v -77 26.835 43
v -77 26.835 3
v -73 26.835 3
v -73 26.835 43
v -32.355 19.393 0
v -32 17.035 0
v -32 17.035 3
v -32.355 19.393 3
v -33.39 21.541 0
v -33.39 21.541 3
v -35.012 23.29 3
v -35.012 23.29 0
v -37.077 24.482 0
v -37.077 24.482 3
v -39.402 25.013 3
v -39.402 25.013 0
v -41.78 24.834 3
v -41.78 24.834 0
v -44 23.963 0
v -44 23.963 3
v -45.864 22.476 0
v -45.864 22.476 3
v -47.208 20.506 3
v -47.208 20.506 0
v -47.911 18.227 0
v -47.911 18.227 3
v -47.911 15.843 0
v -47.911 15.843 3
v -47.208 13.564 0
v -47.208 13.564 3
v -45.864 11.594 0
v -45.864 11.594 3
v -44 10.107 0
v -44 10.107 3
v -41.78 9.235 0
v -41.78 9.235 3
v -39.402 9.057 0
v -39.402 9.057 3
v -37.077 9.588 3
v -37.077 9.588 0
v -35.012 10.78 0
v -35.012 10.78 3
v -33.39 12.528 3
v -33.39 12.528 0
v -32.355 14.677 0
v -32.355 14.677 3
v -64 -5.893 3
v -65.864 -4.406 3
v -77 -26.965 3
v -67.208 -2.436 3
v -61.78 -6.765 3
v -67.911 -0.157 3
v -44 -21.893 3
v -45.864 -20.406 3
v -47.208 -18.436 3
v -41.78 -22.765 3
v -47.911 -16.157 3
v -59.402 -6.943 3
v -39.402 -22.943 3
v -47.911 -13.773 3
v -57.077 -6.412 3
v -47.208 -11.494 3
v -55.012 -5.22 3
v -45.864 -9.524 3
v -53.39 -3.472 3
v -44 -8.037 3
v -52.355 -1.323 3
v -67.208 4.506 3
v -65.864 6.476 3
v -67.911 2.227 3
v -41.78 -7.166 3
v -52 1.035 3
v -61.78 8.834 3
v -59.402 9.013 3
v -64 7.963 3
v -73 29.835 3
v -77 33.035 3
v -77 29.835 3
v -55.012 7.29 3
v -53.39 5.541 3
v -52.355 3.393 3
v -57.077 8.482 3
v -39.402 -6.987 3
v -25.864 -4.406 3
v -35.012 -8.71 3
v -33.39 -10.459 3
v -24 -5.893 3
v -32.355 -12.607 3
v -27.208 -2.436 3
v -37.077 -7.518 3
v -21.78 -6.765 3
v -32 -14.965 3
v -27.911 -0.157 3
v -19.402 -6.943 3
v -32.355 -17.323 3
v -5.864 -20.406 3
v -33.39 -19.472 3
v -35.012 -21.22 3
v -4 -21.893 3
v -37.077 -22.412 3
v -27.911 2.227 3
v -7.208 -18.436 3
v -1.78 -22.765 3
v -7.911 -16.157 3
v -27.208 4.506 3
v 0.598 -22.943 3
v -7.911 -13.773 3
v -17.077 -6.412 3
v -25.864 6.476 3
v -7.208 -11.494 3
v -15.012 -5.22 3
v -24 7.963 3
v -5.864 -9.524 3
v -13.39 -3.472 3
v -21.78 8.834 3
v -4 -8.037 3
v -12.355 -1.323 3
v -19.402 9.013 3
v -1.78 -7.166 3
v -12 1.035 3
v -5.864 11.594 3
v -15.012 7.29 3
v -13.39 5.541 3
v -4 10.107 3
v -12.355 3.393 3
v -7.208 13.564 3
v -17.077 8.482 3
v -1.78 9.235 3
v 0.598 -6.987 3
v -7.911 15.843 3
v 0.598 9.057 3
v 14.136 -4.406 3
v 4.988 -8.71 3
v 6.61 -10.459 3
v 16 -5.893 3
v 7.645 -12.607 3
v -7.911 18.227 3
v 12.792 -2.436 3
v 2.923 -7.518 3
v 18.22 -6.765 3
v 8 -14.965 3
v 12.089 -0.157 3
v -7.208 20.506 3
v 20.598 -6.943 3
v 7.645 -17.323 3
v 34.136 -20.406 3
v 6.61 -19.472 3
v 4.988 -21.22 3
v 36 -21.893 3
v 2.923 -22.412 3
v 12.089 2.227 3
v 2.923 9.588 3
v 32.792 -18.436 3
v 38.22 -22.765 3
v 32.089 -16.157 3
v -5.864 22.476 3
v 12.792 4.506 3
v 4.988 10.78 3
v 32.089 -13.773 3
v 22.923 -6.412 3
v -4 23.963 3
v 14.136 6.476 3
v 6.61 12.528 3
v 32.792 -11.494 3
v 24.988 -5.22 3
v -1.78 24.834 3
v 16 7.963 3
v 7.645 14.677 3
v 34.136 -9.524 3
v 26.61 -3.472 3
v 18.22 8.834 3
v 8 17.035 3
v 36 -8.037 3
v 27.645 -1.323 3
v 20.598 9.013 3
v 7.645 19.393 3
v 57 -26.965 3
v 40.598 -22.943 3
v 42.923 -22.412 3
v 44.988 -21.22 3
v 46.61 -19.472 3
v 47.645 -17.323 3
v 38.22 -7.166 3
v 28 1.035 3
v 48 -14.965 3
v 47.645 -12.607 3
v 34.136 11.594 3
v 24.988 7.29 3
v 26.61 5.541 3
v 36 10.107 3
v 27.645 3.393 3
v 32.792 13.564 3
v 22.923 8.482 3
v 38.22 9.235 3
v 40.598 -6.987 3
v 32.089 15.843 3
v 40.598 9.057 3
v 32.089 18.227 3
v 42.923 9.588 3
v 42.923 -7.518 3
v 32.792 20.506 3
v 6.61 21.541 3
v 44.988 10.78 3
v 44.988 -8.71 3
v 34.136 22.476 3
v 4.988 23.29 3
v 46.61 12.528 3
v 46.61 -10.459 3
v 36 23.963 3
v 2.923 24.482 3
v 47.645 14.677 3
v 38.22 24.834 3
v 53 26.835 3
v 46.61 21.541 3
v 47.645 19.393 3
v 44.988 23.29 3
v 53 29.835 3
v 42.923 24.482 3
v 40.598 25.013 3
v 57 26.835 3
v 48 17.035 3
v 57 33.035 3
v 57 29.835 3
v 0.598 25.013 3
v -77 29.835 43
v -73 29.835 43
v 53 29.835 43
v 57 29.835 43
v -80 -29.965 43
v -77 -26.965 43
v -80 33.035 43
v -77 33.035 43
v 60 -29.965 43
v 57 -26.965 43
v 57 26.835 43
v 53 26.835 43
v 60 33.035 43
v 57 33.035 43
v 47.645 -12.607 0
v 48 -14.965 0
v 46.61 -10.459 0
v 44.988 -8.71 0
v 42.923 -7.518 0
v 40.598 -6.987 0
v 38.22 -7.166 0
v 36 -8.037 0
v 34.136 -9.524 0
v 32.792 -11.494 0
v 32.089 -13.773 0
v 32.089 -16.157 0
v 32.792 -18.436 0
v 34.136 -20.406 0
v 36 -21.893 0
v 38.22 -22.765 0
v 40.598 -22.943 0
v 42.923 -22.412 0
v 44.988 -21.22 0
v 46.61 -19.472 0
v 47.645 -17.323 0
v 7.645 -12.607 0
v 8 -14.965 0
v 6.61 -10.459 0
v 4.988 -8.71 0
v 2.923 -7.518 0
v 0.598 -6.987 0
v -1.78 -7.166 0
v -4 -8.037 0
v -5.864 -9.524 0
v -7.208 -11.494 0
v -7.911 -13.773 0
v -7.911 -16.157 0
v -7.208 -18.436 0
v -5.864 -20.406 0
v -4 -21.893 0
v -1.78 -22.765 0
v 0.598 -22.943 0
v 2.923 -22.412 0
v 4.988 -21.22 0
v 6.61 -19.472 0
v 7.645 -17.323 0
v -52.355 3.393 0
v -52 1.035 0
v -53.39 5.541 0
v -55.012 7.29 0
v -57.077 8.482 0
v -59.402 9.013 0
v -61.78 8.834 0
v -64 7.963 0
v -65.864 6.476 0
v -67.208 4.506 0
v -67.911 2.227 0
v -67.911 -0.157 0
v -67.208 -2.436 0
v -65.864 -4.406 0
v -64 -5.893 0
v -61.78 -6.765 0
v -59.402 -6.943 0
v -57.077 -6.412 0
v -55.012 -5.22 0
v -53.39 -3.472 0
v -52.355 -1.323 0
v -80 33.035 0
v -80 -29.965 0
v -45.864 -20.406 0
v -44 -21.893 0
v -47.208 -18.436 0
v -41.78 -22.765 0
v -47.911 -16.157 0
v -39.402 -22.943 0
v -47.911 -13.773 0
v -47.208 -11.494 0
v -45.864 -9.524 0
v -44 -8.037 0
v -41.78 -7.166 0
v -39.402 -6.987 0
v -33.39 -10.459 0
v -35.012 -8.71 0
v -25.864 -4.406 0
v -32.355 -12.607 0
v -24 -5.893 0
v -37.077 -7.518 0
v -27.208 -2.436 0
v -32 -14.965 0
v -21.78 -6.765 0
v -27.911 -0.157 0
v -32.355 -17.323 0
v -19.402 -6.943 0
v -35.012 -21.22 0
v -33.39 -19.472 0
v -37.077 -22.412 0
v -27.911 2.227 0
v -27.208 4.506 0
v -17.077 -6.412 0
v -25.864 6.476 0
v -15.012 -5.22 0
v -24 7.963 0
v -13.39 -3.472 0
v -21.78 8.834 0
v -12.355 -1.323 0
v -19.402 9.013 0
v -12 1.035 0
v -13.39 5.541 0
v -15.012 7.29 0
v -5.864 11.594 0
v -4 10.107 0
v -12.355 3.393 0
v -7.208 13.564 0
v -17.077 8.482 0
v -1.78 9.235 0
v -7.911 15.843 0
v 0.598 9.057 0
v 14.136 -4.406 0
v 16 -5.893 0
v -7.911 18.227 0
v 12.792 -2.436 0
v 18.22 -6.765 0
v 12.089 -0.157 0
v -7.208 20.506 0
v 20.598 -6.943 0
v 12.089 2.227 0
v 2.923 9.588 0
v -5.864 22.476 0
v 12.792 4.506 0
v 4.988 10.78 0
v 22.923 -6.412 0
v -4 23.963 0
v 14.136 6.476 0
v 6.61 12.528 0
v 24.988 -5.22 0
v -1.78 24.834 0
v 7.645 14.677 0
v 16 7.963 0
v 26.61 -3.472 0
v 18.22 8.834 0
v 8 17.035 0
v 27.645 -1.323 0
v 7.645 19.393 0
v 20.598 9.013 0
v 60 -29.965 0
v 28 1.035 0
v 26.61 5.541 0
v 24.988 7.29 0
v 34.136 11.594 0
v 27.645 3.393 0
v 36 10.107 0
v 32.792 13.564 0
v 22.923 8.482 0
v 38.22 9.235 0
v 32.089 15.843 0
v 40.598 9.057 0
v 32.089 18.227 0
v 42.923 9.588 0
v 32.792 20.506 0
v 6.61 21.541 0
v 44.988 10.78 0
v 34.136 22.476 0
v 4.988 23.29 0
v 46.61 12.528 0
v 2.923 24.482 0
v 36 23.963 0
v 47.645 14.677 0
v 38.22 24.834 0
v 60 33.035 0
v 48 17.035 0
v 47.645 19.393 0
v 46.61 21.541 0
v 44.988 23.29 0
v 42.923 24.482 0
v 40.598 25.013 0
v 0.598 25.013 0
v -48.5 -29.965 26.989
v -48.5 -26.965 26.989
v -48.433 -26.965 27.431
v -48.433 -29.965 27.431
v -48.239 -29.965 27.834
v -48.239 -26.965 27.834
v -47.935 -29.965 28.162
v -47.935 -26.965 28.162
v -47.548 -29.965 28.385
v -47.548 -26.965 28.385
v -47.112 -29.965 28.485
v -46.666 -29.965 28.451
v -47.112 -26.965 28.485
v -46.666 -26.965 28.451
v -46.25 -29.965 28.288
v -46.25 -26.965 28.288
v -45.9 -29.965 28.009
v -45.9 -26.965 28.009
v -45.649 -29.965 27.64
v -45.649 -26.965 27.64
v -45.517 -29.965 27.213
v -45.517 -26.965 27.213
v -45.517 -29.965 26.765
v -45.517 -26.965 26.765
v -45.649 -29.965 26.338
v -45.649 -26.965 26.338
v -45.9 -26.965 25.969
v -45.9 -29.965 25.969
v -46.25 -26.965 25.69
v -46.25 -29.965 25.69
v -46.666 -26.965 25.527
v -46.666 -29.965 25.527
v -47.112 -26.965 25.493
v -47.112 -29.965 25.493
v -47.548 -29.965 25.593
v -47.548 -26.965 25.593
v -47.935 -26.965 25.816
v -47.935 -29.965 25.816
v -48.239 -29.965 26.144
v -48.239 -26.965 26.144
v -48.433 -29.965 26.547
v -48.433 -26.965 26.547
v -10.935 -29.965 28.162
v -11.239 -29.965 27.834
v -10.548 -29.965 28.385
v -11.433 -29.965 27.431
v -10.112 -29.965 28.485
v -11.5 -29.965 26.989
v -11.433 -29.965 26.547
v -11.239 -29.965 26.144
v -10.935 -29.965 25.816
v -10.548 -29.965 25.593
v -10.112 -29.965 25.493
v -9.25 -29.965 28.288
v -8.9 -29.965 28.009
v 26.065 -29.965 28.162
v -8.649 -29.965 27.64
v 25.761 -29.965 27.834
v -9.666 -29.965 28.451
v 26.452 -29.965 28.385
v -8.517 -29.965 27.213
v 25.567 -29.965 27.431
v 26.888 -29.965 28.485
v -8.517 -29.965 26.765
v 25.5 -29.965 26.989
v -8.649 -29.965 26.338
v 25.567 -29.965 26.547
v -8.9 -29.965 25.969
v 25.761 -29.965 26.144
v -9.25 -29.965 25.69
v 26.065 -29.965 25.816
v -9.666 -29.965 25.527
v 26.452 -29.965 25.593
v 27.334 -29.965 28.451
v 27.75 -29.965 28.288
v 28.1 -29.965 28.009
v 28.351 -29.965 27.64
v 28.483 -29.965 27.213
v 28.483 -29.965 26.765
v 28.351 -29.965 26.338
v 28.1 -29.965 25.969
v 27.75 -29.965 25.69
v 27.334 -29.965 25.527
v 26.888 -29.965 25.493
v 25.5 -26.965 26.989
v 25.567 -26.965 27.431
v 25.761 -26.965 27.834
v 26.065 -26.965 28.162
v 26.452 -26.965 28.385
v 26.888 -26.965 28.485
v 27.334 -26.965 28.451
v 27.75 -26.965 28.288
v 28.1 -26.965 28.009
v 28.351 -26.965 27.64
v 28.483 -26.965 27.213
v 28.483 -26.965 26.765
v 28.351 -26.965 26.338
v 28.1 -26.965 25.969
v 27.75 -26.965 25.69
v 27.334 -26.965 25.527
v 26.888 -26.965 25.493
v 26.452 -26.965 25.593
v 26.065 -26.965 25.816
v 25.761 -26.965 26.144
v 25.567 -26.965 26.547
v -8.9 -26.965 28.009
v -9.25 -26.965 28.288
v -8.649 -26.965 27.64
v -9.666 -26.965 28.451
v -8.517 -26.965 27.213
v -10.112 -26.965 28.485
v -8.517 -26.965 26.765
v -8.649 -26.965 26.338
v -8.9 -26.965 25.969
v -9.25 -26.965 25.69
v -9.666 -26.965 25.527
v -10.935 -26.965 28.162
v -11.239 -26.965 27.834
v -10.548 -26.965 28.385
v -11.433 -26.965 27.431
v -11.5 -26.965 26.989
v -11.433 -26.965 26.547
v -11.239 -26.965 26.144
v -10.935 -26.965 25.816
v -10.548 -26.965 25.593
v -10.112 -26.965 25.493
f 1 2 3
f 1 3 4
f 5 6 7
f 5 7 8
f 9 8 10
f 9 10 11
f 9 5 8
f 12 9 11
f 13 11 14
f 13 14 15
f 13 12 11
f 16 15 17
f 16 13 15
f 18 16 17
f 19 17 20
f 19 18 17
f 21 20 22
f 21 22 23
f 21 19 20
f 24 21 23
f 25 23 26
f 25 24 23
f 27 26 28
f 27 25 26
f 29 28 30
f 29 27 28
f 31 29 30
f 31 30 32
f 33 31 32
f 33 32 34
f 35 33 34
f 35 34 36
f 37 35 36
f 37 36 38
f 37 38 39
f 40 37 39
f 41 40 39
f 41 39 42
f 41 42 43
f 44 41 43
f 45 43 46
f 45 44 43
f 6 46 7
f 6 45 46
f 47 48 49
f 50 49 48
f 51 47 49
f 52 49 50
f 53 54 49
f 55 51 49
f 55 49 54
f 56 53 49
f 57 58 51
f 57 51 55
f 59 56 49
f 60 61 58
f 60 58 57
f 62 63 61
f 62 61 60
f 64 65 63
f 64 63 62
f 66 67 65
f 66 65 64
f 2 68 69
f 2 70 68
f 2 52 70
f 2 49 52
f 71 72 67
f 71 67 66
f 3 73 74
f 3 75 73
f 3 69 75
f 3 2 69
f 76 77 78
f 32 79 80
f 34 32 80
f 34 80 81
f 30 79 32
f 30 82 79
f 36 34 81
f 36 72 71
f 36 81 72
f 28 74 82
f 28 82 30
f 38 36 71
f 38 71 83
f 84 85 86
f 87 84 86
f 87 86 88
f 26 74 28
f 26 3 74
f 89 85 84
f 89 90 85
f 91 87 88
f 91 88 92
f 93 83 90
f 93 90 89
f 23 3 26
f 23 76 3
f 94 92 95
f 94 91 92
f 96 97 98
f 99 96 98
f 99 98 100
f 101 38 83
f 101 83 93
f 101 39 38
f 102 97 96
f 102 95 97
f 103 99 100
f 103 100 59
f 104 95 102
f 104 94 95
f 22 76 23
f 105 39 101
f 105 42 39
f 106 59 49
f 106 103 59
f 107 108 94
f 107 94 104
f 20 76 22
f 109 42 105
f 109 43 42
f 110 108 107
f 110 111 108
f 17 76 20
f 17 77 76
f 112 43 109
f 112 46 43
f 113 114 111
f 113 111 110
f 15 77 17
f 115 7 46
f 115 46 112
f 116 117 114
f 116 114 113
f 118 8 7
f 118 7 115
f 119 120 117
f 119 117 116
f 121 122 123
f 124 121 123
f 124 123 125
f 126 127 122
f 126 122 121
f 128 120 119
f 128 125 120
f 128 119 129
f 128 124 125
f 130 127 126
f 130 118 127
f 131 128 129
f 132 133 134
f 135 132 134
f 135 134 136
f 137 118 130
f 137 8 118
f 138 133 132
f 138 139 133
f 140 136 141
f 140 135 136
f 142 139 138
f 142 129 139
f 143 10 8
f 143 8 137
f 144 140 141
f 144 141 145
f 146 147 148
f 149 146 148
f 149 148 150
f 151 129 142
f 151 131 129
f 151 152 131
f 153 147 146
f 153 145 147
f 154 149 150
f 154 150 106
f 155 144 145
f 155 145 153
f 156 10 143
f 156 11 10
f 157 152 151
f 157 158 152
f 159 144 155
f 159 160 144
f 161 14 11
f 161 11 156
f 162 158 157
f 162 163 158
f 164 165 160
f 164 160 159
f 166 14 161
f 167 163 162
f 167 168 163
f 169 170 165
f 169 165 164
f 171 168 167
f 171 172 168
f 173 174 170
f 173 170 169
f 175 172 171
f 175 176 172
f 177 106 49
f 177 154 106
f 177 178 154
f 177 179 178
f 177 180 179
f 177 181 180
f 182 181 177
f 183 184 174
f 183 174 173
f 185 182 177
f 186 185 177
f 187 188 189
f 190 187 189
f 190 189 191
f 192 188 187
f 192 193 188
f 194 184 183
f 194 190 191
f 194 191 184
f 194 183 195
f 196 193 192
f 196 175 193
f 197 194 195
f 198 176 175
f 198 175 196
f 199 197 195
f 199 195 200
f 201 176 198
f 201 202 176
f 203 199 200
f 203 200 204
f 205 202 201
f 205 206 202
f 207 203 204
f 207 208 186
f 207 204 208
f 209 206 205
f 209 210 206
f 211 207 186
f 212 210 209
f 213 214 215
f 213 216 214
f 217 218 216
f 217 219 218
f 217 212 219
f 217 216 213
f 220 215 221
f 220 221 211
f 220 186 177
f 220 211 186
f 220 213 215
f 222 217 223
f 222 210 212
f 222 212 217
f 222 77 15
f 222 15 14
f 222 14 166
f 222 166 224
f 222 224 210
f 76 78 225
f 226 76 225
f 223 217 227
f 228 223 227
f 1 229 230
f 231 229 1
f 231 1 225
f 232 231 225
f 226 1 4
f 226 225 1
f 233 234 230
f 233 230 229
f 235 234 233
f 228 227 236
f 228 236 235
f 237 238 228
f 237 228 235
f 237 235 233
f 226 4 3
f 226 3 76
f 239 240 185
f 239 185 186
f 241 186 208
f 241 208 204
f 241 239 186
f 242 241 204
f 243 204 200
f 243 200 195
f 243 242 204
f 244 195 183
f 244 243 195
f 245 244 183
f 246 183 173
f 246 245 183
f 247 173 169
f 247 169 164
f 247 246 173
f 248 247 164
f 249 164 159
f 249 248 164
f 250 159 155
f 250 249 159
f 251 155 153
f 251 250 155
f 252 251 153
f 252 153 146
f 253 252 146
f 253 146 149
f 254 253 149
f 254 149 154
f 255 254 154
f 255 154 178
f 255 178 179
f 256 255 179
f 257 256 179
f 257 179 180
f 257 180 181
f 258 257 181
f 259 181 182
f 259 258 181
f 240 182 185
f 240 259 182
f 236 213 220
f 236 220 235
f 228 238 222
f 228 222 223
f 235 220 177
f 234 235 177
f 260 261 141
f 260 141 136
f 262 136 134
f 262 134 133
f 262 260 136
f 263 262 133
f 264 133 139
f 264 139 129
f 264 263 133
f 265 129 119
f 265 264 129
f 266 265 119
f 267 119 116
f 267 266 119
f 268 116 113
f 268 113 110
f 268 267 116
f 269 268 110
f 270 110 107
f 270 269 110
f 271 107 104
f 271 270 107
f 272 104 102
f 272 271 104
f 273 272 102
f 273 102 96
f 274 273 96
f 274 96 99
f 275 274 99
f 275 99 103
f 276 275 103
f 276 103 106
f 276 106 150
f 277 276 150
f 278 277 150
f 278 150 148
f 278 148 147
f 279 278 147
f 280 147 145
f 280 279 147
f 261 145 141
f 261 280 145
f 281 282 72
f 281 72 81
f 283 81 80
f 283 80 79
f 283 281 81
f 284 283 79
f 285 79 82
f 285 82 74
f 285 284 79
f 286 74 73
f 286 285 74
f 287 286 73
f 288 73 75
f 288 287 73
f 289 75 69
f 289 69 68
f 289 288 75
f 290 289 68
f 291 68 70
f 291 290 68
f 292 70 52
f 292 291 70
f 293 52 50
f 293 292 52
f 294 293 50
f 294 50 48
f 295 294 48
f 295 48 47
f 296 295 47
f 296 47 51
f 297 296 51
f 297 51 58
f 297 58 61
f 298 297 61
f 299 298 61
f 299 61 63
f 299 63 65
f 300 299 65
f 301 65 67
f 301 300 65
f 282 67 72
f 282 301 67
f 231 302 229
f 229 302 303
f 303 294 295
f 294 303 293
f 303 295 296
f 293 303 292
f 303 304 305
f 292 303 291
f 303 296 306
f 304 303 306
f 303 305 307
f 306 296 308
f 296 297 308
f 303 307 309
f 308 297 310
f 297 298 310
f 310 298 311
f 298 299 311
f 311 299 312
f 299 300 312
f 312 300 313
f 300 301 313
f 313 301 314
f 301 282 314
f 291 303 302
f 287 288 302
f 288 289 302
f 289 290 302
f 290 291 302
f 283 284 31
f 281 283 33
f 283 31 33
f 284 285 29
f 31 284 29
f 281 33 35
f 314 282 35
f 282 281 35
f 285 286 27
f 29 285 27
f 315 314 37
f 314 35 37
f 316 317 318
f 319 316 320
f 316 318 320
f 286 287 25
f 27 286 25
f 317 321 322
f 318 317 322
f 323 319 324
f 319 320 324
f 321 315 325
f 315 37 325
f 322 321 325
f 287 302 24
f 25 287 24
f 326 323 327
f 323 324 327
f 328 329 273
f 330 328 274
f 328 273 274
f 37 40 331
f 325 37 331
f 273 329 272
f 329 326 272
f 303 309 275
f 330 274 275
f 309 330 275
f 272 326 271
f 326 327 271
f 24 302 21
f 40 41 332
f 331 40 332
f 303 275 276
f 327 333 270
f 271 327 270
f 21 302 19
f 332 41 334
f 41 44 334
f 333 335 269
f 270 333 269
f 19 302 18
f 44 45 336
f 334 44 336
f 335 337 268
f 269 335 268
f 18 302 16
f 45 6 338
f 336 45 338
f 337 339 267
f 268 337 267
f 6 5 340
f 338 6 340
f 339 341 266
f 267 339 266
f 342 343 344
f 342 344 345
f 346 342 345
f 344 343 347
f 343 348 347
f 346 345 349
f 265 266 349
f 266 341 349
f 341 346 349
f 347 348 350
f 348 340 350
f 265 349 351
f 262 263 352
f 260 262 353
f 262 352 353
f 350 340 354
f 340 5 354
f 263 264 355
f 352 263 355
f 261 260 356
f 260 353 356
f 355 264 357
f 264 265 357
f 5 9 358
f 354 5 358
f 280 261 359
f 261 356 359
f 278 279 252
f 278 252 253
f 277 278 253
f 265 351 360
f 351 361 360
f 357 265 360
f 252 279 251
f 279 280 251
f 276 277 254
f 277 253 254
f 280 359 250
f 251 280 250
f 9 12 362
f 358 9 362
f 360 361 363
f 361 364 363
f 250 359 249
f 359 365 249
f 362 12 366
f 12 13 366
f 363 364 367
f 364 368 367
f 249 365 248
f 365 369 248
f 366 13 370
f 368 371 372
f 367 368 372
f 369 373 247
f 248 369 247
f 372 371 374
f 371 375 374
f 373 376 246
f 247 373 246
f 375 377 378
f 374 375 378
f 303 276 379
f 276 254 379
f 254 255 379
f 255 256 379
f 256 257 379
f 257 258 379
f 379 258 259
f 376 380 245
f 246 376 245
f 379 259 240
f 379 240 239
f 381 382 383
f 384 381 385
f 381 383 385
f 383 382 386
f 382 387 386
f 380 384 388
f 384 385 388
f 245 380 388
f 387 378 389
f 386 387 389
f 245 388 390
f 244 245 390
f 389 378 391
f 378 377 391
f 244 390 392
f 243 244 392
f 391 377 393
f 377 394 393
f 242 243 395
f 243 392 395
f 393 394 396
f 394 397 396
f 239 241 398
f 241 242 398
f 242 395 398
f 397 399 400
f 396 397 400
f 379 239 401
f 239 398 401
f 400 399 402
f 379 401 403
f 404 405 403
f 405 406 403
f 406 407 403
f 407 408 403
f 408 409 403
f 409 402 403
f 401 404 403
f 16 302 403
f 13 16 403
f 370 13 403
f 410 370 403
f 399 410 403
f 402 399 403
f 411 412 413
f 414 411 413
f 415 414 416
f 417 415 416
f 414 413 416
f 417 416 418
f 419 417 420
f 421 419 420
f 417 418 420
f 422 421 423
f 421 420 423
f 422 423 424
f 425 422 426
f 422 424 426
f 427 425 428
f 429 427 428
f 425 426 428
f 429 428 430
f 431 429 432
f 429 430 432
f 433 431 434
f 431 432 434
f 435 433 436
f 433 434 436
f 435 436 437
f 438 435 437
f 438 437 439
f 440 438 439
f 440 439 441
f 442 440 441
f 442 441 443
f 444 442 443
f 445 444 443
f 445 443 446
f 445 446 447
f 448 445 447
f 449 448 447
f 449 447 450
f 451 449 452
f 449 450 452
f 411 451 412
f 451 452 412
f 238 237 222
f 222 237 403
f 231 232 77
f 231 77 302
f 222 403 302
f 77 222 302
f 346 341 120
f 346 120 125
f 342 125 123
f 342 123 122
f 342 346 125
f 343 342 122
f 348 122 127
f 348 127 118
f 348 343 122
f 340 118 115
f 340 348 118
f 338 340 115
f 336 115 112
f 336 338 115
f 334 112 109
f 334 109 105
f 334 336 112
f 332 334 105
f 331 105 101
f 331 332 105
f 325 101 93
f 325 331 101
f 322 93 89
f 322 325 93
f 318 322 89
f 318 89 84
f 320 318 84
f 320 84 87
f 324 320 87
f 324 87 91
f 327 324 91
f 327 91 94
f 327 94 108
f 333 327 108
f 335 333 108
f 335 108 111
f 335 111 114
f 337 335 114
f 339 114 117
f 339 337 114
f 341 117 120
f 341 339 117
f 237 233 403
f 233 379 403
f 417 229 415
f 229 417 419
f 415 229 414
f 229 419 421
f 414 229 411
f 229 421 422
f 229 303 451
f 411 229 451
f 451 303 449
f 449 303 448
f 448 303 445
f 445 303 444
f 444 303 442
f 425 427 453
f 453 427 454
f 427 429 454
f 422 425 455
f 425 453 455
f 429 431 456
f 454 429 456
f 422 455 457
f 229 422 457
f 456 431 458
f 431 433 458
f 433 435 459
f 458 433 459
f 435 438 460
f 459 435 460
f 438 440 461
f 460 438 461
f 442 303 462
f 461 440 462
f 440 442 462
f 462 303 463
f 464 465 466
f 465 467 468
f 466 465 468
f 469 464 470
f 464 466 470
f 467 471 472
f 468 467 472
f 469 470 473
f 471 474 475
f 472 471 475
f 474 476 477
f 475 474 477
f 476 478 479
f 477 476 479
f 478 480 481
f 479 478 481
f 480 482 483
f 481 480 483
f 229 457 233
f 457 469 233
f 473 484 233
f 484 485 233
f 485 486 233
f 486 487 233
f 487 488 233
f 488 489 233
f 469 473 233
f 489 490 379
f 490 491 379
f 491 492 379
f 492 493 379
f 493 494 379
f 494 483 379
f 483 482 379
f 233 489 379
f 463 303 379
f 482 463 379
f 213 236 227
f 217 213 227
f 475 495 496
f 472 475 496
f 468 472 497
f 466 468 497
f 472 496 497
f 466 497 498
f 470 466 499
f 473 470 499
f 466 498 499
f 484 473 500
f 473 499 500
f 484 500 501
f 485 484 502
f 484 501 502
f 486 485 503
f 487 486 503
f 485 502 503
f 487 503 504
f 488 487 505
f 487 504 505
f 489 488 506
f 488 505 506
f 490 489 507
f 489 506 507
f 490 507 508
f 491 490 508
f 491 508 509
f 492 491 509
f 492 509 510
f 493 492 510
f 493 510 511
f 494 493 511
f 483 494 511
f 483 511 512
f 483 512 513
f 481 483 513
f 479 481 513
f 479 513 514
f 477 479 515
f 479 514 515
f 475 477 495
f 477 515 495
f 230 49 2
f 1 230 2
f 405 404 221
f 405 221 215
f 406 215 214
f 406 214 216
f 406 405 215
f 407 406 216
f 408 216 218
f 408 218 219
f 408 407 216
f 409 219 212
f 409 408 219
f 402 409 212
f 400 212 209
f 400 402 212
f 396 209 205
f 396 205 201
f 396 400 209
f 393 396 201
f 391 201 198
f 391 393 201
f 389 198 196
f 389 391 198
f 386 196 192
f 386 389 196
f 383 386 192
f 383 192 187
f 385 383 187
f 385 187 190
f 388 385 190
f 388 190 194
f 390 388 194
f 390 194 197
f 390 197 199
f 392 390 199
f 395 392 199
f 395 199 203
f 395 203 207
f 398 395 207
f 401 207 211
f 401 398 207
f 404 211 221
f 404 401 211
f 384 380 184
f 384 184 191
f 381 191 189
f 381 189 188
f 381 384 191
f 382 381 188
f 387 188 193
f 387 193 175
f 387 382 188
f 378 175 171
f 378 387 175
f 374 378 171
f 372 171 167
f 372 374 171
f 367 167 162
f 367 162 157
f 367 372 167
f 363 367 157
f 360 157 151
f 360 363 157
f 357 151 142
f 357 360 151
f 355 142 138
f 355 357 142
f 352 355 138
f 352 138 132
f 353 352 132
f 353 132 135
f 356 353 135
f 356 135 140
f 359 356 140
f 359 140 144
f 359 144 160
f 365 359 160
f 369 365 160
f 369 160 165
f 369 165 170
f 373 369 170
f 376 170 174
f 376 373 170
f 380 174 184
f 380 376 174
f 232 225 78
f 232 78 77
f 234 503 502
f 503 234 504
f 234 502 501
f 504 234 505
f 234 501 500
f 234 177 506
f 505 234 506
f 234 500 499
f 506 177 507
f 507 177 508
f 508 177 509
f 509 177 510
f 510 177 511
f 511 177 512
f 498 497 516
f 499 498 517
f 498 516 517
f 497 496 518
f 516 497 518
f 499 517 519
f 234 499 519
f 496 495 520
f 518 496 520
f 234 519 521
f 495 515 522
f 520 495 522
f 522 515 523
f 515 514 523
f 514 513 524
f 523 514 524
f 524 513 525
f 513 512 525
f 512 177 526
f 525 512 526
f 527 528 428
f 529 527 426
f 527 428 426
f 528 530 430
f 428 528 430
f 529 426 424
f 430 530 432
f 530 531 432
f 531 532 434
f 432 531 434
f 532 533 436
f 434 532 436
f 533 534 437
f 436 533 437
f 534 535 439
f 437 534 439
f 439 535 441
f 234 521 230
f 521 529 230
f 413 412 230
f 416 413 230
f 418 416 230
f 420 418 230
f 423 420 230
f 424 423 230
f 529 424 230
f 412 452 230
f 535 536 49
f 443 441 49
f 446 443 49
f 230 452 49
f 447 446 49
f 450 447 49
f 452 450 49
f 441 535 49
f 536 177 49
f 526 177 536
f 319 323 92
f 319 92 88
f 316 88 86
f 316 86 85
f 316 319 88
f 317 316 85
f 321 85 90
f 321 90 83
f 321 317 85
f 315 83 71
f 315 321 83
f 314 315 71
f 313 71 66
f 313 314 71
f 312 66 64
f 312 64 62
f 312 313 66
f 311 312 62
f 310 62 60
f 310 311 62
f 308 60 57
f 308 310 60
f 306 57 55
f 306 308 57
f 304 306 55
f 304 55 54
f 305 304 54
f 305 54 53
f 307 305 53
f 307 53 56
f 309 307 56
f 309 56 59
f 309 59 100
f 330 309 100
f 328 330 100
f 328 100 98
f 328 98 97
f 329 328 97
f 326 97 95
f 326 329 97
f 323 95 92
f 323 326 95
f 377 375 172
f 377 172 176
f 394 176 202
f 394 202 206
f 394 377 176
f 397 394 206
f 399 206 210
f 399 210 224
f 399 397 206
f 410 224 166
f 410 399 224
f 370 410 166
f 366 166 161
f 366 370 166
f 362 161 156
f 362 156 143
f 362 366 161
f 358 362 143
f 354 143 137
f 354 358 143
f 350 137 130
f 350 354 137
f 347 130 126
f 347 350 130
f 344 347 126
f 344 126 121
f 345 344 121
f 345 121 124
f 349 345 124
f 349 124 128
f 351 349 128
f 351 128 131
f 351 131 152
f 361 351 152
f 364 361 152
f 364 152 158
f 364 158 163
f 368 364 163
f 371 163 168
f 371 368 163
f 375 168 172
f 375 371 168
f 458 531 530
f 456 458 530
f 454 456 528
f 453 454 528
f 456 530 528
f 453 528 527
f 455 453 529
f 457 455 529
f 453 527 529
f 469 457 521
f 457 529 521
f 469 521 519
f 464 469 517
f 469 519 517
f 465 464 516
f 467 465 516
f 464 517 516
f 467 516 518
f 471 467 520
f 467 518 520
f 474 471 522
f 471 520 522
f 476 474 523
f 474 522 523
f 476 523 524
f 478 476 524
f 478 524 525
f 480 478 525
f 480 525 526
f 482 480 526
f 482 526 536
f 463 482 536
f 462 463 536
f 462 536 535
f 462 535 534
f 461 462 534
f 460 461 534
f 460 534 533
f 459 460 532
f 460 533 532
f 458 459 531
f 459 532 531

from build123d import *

# Parameters (mm, degrees)
F0_R     = 8
F1_DEPTH = 3
F2_W     = 3
F2_H     = 3
F2_W_2   = 134
F3_DEPTH = 40
F4_W     = 3
F4_H     = 40
F5_DEPTH = 134
F6_W     = 126
F6_H     = 3
F7_DEPTH = 40
F8_R     = 1.5
F9_DEPTH = 3


with BuildPart() as f1:
    # F0 (on Top) → F1 (new body)
    with BuildSketch(Plane.XY):
        Polygon((-60, 33.034884), (-80, 33.034884), (-80, 18.034884), (-80, 0.034884), (-80, -2.965116), (-80, -17.965116), (-80, -29.965116), (60, -29.965116), (60, -24.965116), (60, -14.965116), (60, -9.965116), (60, -4.965116), (60, 0.034884), (60, 18.034884), (60, 33.034884), (40, 33.034884), (20, 33.034884), (0, 33.034884), (-20, 33.034884), (-40, 33.034884), align=None)
        with Locations((-40, -14.965116)):
            Circle(F0_R, mode=Mode.SUBTRACT)
        with Locations((0, -14.965116)):
            Circle(F0_R, mode=Mode.SUBTRACT)
        with Locations((40, -14.965116)):
            Circle(F0_R, mode=Mode.SUBTRACT)
        with Locations((-60, 1.034884)):
            Circle(F0_R, mode=Mode.SUBTRACT)
        with Locations((-20, 1.034884)):
            Circle(F0_R, mode=Mode.SUBTRACT)
        with Locations((-40, 17.034884)):
            Circle(F0_R, mode=Mode.SUBTRACT)
        with Locations((20, 1.034884)):
            Circle(F0_R, mode=Mode.SUBTRACT)
        with Locations((0, 17.034884)):
            Circle(F0_R, mode=Mode.SUBTRACT)
        with Locations((40, 17.034884)):
            Circle(F0_R, mode=Mode.SUBTRACT)
    extrude(amount=F1_DEPTH)

    # F2 (on face) → F3 (join)
    with BuildSketch(Plane.XY.offset(3)):
        with Locations((-78.5, -28.465116)):
            Rectangle(F2_W, F2_H)
        with Locations((-10, -28.465116)):
            Rectangle(F2_W_2, F2_H)
        Polygon((-80, 30.034884), (-80, -26.965116), (-77, -26.965116), (-77, 33.034884), (-80, 33.034884), align=None)
        with Locations((58.5, -28.465116)):
            Rectangle(F2_W, F2_H)
        Polygon((57, 33.034884), (57, -26.965116), (60, -26.965116), (60, 30.034884), (60, 33.034884), align=None)
    extrude(amount=F3_DEPTH)

    # F4 (on face) → F5 (join)
    with BuildSketch(Plane.YZ.offset(-77)):
        with Locations((28.334884, 23)):
            Rectangle(F4_W, F4_H)
    extrude(amount=F5_DEPTH)

    # F6 (on face) → F7 (cut)
    with BuildSketch(Plane.XY.offset(43)):
        with Locations((-10, 28.334884)):
            Rectangle(F6_W, F6_H)
    extrude(amount=-F7_DEPTH, mode=Mode.SUBTRACT)

    # F8 (on face) → F9 (cut)
    with BuildSketch(Plane(origin=(0, -26.965116, 0), x_dir=(-1, 0, 0), z_dir=(0, 1, 0))):
        with Locations((47, 26.988985)):
            Circle(F8_R)
        with Locations((-27, 26.988985)):
            Circle(F8_R)
        with Locations((10, 26.988985)):
            Circle(F8_R)
    extrude(amount=-F9_DEPTH, mode=Mode.SUBTRACT)


solid = f1.part
